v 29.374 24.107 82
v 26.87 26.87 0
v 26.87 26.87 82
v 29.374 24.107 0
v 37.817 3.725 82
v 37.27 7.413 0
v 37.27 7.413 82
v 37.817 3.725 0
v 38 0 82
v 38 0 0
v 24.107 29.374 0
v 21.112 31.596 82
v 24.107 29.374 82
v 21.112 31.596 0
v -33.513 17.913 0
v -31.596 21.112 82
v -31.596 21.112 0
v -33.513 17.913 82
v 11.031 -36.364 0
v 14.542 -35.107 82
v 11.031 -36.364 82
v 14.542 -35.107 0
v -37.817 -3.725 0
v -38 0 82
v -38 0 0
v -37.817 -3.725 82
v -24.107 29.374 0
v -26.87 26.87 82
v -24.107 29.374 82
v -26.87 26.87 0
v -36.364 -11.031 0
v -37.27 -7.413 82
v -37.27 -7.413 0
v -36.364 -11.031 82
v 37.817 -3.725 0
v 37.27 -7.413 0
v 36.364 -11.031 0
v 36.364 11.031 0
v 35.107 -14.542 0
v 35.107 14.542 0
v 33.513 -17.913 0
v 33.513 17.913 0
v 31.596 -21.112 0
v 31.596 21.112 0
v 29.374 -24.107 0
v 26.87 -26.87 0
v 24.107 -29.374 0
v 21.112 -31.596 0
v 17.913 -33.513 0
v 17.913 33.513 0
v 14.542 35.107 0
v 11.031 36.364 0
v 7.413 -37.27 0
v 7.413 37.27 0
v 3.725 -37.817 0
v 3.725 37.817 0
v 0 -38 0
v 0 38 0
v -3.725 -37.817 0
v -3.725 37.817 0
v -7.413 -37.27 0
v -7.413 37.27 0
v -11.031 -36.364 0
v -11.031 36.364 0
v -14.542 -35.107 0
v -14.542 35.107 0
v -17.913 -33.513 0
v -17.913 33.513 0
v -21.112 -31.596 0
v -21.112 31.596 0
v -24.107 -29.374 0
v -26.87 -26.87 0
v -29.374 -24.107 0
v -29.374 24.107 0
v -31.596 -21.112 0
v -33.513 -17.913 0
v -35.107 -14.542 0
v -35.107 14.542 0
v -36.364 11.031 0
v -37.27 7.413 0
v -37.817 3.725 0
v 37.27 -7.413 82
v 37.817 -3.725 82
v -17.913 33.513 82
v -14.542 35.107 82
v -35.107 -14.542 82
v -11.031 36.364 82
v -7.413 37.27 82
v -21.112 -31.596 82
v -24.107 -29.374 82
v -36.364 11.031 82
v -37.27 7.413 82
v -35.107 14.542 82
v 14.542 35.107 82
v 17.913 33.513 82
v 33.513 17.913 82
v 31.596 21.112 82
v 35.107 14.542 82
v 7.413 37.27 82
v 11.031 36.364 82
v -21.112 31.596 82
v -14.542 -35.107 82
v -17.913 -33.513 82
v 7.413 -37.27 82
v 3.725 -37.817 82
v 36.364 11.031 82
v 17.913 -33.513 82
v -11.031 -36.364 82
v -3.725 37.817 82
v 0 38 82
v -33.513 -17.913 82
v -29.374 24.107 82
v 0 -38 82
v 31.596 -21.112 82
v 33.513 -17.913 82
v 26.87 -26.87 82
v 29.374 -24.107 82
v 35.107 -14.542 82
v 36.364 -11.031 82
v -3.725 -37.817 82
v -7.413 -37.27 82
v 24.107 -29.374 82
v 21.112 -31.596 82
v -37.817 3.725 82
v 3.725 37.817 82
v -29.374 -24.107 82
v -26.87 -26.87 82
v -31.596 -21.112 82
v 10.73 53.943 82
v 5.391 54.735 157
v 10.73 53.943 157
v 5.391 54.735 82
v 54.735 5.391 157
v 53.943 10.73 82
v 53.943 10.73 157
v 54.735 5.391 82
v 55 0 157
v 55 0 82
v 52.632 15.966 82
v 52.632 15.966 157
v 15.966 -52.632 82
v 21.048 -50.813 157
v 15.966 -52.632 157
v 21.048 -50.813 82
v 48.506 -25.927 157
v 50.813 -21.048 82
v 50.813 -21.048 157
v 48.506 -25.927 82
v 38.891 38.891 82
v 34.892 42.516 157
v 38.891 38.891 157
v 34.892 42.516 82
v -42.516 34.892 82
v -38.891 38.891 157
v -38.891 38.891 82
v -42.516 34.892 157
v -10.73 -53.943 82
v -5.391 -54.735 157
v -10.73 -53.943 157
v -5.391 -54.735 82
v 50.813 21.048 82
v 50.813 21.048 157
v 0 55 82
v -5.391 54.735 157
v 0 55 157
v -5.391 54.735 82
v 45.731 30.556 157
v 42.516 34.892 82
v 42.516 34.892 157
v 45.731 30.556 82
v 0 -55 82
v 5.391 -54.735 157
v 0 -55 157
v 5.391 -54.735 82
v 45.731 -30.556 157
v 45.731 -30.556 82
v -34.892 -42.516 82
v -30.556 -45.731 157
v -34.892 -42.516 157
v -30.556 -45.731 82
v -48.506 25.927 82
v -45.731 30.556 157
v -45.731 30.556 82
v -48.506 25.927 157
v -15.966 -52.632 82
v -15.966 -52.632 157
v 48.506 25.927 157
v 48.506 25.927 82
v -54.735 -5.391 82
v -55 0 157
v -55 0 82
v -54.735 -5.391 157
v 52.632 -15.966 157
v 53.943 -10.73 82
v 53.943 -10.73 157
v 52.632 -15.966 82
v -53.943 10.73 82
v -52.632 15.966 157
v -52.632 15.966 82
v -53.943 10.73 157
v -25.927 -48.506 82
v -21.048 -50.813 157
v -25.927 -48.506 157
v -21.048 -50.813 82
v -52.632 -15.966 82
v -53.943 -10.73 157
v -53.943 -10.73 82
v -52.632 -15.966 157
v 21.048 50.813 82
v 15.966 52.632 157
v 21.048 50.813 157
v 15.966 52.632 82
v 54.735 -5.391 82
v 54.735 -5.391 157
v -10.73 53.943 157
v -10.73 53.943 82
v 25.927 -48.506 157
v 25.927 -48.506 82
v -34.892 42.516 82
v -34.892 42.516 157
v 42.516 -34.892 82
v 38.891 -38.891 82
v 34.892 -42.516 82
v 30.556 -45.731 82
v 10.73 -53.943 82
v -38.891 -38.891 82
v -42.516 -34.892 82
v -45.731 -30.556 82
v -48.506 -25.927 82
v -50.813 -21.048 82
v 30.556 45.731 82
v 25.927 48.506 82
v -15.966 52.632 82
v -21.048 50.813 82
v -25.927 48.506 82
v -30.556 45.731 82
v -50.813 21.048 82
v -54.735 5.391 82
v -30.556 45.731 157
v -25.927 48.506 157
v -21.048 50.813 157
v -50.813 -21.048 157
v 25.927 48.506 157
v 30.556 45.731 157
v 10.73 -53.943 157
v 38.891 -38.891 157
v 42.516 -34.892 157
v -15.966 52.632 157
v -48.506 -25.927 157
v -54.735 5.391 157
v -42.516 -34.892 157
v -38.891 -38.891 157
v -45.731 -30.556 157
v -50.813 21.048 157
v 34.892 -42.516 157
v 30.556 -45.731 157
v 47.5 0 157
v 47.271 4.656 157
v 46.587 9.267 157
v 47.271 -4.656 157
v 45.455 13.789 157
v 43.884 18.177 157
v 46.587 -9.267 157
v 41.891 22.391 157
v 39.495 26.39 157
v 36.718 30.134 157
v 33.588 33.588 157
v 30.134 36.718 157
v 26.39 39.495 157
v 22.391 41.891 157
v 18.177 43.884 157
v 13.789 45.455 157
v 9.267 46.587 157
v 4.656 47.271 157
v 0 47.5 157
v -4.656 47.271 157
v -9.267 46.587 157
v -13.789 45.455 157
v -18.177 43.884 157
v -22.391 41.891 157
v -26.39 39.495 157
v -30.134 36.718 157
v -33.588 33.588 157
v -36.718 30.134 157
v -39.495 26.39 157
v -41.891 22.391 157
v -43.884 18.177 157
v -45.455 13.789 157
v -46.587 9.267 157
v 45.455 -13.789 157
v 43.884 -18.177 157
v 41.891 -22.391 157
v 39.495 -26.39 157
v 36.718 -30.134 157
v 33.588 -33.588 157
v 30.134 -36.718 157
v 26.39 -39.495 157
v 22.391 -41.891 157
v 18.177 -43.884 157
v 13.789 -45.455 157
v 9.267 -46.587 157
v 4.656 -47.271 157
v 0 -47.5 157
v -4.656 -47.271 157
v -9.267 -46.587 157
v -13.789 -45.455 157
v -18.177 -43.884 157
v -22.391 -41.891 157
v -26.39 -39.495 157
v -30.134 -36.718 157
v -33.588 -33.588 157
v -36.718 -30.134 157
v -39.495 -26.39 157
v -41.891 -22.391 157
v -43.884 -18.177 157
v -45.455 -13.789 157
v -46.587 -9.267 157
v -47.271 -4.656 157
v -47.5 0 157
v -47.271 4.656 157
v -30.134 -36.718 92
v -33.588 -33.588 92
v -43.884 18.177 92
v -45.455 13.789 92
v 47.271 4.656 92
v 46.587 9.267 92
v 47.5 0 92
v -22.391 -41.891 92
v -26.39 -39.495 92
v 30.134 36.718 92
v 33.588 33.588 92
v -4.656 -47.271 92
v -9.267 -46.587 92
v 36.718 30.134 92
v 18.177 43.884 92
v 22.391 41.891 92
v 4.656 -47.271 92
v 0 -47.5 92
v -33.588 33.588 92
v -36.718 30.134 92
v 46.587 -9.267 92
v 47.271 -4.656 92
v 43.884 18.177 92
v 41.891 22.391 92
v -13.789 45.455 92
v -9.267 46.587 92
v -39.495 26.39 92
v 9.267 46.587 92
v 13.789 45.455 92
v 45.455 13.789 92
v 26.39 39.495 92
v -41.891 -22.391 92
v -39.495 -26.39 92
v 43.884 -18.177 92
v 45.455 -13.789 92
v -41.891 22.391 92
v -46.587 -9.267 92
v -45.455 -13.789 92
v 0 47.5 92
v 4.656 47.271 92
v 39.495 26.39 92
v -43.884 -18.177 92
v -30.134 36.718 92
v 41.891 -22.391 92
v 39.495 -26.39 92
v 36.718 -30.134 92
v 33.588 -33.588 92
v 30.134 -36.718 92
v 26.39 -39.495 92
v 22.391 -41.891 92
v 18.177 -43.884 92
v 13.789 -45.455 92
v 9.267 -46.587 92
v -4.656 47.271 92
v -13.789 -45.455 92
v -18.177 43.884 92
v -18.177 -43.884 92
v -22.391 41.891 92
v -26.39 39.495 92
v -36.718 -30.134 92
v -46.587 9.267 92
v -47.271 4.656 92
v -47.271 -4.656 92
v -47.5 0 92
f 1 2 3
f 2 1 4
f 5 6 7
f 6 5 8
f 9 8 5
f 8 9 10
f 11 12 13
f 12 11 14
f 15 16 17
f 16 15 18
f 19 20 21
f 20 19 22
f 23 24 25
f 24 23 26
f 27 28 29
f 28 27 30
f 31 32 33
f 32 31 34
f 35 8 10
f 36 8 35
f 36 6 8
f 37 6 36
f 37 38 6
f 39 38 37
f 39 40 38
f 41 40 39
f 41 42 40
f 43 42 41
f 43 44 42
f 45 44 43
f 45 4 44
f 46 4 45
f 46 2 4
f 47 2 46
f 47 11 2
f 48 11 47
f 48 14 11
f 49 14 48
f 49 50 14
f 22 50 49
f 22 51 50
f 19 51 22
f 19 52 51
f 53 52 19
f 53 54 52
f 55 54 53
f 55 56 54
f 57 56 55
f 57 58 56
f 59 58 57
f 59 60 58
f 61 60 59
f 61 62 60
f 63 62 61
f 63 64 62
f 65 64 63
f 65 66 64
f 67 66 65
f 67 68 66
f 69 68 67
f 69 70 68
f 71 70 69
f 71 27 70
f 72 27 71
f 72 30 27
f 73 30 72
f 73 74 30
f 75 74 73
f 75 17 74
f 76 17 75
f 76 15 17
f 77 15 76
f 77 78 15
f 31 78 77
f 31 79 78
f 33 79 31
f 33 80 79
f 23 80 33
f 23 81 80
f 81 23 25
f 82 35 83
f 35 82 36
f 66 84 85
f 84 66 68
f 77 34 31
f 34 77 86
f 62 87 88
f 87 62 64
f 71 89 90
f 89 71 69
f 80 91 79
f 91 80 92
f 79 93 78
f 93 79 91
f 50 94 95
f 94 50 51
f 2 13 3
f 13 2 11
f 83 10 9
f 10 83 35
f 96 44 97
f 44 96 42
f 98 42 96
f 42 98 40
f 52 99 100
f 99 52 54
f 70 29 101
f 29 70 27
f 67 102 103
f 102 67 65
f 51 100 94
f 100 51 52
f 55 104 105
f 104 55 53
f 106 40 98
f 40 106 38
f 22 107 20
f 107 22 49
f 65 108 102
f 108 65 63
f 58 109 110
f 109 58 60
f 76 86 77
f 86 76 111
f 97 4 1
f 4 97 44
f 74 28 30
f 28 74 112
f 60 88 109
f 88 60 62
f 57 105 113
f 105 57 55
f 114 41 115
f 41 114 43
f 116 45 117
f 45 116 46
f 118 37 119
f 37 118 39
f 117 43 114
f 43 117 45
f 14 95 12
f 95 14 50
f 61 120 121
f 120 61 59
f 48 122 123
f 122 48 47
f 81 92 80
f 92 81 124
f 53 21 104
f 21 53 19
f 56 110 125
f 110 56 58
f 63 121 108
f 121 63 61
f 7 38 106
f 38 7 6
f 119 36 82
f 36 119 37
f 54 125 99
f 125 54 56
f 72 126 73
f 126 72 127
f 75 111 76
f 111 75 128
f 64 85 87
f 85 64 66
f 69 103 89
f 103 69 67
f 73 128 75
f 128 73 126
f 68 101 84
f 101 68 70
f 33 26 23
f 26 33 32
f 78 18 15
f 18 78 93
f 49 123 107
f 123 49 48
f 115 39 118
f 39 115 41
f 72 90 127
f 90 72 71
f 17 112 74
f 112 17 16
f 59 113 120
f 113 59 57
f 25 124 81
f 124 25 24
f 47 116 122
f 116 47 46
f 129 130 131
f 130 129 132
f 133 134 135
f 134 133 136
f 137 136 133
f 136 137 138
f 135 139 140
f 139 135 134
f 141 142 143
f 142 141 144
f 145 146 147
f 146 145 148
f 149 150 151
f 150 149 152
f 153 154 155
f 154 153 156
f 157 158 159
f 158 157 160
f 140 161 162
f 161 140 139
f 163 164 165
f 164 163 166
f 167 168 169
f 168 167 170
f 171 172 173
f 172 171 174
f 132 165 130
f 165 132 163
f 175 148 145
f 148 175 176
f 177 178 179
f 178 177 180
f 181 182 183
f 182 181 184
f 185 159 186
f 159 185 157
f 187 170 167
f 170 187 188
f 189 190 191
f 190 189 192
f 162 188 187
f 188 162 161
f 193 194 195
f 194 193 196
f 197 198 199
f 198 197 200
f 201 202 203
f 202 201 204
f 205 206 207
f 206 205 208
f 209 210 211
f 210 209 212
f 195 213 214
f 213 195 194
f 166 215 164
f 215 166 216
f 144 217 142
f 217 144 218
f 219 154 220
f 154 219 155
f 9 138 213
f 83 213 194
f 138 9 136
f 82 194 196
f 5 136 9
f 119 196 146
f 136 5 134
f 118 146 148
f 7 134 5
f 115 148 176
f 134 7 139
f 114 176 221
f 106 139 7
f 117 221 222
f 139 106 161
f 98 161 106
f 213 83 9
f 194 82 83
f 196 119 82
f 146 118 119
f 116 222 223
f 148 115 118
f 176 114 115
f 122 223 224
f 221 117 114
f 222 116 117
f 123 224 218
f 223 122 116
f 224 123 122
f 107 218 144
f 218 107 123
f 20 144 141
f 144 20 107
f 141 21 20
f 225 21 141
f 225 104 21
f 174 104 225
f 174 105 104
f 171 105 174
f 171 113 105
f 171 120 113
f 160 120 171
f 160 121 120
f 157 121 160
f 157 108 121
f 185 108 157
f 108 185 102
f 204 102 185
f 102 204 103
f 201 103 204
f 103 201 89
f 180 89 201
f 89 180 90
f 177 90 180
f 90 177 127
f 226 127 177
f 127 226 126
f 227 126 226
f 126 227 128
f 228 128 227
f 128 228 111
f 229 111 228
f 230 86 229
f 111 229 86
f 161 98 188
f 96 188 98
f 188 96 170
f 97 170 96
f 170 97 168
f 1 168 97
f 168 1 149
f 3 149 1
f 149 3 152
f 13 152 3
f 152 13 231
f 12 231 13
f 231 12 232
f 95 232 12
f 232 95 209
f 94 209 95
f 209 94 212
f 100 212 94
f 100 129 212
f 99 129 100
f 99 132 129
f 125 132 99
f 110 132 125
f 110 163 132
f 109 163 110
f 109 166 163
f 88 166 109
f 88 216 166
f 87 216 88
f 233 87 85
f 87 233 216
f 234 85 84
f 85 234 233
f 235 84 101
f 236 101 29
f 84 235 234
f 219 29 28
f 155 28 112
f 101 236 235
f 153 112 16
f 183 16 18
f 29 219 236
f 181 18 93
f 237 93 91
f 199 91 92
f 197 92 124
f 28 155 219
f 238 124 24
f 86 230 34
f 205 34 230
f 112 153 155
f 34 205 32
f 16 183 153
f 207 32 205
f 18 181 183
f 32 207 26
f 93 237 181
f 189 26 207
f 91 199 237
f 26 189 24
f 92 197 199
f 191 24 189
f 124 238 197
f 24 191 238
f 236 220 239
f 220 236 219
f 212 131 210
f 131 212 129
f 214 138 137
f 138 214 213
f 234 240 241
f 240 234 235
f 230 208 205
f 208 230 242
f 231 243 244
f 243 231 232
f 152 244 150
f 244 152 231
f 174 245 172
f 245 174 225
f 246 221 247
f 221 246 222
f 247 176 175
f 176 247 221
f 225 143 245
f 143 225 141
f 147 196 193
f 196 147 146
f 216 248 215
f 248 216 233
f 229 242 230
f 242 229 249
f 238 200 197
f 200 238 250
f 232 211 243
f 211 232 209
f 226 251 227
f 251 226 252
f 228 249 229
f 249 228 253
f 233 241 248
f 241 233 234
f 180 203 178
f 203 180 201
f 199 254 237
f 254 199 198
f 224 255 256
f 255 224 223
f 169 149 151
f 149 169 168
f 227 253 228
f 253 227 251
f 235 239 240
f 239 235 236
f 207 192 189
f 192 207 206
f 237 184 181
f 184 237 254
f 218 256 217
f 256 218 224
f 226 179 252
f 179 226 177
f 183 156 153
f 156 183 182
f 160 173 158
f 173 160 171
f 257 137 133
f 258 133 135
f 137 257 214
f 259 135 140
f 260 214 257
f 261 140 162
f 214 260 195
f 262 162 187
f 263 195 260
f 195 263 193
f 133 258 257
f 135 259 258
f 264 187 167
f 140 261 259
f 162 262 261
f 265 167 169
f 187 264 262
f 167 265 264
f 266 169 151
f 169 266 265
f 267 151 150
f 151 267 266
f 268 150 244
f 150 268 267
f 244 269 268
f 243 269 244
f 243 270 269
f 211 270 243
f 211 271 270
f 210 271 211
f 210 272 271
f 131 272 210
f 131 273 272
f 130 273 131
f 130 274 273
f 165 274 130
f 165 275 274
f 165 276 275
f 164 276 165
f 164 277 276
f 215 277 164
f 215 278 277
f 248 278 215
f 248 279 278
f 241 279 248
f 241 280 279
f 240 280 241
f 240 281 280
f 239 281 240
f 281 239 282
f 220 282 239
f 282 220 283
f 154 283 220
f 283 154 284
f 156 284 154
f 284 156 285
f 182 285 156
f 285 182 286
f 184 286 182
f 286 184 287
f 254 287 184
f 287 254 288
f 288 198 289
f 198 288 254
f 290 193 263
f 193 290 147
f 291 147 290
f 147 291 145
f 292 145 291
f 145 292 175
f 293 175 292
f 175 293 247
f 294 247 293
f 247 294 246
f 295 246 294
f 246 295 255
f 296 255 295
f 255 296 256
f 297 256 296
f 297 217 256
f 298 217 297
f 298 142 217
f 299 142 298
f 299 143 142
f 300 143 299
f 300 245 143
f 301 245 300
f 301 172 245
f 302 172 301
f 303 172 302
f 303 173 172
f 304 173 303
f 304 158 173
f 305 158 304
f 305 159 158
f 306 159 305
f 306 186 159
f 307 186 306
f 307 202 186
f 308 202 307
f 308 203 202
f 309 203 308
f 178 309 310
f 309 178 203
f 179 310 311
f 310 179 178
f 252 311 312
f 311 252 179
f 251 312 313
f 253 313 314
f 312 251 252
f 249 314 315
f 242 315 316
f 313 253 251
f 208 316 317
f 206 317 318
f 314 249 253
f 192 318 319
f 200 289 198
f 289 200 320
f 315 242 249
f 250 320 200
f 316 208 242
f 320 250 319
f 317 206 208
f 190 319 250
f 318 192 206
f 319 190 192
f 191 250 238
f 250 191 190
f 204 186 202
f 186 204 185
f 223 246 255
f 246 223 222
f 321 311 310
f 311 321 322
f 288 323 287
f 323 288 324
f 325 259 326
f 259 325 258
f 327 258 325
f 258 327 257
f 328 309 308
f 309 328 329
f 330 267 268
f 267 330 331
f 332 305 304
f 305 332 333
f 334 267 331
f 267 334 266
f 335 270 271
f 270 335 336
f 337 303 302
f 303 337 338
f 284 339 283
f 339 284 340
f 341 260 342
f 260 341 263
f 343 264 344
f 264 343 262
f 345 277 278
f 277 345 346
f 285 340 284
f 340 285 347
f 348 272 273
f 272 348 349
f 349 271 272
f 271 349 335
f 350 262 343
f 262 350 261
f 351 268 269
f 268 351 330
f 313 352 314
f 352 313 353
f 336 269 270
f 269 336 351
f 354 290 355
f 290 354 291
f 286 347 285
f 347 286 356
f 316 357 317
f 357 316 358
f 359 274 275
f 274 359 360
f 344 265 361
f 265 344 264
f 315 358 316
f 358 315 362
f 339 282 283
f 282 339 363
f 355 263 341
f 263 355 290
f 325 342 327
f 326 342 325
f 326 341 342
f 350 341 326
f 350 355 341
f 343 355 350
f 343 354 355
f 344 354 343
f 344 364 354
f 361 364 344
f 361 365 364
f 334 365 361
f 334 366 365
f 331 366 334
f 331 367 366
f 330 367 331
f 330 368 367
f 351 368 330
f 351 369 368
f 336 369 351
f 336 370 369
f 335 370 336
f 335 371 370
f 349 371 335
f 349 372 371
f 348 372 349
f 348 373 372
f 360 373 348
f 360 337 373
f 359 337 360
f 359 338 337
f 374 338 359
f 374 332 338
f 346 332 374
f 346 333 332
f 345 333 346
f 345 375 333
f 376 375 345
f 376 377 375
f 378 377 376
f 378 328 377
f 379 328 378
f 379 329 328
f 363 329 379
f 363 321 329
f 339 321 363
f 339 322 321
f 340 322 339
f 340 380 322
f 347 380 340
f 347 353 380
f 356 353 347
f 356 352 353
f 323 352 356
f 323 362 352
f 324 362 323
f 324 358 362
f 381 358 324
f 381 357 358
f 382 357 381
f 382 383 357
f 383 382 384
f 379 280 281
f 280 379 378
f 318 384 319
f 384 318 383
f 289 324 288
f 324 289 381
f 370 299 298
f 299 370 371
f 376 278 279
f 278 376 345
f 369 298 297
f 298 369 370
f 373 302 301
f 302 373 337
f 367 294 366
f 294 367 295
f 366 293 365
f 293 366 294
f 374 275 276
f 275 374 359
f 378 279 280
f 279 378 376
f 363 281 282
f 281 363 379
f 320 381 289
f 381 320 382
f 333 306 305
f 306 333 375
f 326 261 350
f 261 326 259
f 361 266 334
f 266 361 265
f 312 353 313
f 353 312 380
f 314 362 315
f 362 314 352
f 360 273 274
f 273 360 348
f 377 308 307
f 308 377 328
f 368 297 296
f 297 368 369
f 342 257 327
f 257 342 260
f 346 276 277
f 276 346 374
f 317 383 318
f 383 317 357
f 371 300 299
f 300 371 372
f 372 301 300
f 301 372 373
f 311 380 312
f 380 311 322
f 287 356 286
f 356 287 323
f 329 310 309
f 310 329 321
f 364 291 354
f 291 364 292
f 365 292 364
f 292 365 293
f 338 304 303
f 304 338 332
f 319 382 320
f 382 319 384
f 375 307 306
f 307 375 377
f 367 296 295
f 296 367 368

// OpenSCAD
$fn = 64;

difference() {
  union() {
    cylinder(h=100, d=76, center=false);
    //cylinder(h=92, d1=0, d2=110, center=false);
    translate([0, 0, 82])
      cylinder(h=75, d=110, center=false);
  }
  translate([0, 0, 92])
    cylinder(h=78, d=95, center=false);
}
